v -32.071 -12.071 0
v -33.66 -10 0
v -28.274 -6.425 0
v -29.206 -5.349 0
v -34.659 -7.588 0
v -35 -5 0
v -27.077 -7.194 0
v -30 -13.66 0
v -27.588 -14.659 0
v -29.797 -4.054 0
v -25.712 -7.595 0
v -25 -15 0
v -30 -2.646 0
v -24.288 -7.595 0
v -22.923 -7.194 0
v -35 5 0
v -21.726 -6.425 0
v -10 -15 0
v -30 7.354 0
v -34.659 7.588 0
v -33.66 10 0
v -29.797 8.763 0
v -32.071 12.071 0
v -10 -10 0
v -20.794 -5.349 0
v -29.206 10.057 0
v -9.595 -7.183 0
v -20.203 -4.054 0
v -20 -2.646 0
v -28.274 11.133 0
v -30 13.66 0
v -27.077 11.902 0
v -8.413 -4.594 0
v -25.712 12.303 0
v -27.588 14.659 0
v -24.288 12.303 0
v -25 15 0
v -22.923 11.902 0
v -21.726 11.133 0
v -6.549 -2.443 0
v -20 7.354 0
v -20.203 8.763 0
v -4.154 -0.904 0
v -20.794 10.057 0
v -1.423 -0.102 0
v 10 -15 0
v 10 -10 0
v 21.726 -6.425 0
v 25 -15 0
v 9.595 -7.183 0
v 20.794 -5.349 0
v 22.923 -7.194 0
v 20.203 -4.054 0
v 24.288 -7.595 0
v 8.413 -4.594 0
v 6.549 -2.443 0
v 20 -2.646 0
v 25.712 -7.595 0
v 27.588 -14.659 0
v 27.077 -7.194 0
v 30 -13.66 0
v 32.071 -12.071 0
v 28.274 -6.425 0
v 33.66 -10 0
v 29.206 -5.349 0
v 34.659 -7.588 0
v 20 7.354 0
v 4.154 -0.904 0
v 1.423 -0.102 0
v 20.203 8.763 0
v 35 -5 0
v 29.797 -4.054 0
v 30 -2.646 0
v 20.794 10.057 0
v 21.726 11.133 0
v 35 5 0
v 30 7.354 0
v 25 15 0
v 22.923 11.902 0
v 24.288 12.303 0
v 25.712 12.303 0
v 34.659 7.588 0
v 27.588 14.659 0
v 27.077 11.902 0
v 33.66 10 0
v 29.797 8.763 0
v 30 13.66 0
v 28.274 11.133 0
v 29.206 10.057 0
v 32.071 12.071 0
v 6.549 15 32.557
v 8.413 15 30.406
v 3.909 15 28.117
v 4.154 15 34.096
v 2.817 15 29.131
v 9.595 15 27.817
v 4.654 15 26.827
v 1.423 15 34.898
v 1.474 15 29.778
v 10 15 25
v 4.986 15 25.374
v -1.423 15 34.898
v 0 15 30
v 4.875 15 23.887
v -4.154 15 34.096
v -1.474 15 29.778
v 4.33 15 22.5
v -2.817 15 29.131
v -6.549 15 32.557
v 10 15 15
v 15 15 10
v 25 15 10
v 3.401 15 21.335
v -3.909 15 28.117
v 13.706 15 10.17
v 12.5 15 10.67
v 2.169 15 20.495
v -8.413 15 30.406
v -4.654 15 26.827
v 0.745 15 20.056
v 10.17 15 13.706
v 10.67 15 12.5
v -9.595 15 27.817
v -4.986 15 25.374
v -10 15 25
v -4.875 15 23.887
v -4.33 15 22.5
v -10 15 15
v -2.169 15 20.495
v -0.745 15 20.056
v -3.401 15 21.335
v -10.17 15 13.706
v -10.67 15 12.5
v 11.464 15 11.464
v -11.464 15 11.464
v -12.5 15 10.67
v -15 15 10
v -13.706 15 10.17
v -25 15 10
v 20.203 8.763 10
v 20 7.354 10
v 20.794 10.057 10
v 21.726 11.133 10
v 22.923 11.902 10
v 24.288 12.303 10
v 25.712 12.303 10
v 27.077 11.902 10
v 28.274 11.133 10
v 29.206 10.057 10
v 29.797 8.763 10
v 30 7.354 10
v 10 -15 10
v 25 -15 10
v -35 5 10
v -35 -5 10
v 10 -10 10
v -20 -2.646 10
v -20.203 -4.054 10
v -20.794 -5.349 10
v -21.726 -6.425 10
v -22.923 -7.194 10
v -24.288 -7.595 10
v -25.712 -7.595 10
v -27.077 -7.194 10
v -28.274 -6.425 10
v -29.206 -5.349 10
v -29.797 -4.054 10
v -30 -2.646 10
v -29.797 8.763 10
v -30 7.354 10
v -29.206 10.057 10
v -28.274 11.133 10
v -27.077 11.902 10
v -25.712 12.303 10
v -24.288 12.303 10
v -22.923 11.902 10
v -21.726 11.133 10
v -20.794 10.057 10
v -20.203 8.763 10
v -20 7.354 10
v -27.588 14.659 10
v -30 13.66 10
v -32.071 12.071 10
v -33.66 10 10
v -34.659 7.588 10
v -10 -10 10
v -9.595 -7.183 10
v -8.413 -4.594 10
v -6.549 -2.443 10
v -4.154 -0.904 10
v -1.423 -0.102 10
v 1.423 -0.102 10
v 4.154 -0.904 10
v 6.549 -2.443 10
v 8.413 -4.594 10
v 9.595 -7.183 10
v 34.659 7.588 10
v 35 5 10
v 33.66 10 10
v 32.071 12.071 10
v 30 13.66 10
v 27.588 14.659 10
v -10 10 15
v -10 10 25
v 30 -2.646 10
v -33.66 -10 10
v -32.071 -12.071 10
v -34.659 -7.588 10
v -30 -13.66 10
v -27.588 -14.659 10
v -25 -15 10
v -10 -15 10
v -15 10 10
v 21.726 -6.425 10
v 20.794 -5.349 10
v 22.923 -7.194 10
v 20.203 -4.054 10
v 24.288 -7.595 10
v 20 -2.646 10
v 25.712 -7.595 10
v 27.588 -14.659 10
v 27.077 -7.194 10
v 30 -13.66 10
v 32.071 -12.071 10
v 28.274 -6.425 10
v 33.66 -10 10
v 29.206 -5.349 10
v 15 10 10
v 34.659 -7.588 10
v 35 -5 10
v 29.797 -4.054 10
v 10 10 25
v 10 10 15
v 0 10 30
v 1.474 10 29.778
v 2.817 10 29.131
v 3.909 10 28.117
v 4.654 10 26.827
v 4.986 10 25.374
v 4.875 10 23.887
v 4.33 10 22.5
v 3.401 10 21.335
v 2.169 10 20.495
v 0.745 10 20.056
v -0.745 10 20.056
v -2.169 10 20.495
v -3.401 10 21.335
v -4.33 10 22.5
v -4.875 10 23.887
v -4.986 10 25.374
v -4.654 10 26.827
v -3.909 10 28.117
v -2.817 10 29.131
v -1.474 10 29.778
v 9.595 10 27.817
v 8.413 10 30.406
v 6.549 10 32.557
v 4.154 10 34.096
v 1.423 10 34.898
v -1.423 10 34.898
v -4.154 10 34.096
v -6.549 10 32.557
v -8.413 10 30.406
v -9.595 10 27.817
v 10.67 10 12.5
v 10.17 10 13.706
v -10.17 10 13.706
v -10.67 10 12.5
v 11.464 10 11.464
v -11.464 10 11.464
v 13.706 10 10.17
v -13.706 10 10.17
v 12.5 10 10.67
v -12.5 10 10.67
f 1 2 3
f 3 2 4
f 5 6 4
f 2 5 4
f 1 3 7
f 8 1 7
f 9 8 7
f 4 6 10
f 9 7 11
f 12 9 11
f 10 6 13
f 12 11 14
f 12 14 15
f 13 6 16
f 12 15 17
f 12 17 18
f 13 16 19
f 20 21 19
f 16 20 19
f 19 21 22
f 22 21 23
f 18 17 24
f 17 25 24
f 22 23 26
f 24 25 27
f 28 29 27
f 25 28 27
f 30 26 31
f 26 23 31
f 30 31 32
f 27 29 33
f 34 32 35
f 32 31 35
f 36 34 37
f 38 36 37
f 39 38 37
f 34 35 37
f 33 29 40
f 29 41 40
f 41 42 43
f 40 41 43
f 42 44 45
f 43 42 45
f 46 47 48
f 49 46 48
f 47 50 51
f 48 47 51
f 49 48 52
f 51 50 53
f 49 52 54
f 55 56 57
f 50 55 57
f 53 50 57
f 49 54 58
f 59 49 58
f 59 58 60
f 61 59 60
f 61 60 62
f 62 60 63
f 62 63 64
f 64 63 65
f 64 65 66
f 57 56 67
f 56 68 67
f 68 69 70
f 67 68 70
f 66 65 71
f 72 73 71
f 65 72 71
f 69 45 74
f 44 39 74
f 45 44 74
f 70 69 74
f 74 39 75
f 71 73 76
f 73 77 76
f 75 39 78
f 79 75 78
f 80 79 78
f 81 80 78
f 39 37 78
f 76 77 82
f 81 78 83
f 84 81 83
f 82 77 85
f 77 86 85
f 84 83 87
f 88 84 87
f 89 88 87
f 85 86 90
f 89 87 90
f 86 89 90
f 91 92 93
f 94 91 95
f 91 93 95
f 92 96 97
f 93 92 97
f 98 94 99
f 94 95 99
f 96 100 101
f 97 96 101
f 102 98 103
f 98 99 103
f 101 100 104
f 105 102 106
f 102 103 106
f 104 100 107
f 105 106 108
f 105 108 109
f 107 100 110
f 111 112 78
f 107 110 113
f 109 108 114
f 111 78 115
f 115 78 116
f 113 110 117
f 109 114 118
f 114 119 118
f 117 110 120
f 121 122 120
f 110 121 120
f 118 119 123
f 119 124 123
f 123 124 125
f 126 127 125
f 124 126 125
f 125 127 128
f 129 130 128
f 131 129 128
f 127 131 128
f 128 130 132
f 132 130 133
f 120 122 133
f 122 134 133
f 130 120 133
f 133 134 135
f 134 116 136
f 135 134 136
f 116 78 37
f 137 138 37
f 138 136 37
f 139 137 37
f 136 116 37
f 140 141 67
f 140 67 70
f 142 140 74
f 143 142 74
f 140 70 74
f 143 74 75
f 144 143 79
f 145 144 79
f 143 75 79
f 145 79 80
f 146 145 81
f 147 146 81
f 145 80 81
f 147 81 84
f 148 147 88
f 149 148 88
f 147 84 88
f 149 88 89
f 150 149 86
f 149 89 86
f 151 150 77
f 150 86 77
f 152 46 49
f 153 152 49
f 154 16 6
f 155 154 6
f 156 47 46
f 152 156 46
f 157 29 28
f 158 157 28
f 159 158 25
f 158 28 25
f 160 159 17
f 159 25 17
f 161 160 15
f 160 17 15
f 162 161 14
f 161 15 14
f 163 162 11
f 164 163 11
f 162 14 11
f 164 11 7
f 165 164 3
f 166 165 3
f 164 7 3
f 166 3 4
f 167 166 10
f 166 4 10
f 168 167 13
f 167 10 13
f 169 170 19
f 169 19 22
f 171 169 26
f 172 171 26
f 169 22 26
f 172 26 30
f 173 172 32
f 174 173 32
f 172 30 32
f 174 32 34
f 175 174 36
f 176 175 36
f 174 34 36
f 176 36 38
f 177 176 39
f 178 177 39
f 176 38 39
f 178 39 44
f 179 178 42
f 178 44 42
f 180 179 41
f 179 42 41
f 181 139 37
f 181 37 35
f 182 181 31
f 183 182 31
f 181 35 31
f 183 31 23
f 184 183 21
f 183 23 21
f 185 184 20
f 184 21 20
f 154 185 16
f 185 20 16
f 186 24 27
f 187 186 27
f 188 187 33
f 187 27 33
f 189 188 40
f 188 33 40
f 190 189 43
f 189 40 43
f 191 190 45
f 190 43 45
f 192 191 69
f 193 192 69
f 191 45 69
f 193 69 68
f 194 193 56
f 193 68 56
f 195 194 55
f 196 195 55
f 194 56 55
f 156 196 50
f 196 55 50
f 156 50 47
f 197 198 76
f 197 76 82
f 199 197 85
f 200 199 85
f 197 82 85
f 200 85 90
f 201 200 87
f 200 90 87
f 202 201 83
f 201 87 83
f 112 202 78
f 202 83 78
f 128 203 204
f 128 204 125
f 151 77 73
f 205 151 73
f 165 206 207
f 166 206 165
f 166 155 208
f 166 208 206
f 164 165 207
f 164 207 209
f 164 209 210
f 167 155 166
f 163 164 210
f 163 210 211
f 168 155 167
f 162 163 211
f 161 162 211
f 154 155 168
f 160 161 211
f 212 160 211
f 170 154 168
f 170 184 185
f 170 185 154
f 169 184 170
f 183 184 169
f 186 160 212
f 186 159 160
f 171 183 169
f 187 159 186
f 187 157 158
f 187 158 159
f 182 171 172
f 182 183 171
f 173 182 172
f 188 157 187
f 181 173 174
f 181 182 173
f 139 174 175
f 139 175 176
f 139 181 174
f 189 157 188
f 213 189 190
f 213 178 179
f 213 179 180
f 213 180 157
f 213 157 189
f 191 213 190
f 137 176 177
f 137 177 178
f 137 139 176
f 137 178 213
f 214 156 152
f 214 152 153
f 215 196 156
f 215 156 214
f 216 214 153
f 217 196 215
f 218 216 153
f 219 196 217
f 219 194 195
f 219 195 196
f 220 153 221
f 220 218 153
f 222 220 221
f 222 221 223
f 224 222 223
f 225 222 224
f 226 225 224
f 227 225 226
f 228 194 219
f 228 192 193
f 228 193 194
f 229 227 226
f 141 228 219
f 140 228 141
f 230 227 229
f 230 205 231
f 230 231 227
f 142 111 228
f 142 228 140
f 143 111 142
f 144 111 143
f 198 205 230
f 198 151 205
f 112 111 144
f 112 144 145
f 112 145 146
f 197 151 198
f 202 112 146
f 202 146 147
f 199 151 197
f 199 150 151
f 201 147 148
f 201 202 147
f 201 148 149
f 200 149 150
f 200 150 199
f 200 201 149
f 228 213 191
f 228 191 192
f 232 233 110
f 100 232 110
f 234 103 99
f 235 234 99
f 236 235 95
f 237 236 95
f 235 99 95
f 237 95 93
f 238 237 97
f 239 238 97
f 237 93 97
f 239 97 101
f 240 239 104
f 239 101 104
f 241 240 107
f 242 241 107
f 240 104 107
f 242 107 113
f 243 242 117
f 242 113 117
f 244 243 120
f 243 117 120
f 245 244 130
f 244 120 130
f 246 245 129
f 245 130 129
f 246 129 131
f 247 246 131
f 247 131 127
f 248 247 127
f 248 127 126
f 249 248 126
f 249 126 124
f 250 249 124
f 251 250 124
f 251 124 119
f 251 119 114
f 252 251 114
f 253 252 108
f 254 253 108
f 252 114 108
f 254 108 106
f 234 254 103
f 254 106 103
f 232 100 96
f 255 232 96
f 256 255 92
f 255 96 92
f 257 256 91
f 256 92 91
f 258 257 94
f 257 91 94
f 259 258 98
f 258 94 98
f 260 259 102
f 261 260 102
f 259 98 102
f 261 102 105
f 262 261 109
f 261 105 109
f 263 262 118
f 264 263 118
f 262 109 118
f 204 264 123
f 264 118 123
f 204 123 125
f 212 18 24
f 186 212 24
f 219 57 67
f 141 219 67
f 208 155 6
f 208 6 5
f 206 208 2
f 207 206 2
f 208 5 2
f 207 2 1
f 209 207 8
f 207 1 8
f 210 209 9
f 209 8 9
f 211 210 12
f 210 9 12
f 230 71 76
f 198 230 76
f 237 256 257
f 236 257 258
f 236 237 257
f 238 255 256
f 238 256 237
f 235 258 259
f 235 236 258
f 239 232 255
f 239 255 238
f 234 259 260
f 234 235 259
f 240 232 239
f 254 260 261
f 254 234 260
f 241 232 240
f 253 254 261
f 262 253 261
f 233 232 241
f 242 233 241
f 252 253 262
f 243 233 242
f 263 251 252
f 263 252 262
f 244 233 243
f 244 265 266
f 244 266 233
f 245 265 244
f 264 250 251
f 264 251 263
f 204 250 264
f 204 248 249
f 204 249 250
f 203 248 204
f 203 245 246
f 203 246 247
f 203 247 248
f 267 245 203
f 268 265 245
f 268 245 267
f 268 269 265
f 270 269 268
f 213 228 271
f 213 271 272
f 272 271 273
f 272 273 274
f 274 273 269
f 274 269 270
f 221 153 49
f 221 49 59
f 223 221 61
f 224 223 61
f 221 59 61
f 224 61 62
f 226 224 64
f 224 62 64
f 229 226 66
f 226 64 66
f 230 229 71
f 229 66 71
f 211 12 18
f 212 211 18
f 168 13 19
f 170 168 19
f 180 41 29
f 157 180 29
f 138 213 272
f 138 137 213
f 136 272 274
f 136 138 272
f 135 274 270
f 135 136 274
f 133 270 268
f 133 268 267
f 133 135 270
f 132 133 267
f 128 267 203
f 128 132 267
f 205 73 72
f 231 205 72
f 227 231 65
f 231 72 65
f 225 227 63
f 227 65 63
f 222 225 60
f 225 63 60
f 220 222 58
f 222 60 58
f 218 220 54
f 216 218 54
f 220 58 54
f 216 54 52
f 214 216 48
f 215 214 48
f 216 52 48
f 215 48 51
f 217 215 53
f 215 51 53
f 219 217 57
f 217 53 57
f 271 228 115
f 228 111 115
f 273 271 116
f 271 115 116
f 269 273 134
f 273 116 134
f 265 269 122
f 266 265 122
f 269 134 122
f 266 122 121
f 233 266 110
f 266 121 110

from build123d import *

# Parameters (mm, degrees)
BOSS_EXTRUDE1_DEPTH = 10
SKETCH2_W           = 20
SKETCH2_H           = 5
BOSS_EXTRUDE2_DEPTH = 15
FILLET3_R           = 5
FILLET4_R           = 5
BOSS_EXTRUDE4_DEPTH = 5
SKETCH4_R           = 5
CUT_EXTRUDE1_DEPTH  = 5


with BuildPart() as part:
    # Sketch1 → Boss-Extrude1 (new body)
    with BuildSketch(Plane.XY):
        with BuildLine():
            Line((-10, -15), (-10, -10))
            ThreePointArc((-10, -10), (0, 0), (10, -10))
            Line((10, -10), (10, -15))
            Line((10, -15), (25, -15))
            ThreePointArc((25, -15), (32.071067812, -12.071067812), (35, -5))
            Line((35, -5), (35, 5))
            ThreePointArc((35, 5), (32.071067812, 12.071067812), (25, 15))
            Line((25, 15), (-25, 15))
            ThreePointArc((-25, 15), (-32.071067812, 12.071067812), (-35, 5))
            Line((-35, 5), (-35, -5))
            ThreePointArc((-35, -5), (-32.071067812, -12.071067812), (-25, -15))
            Line((-25, -15), (-10, -15))
        make_face()
        with BuildLine():
            Line((30, 7.354167283), (30, -2.645832717))
            ThreePointArc((30, -2.645832717), (25, -7.645832717), (20, -2.645832717))
            Line((20, -2.645832717), (20, 7.354167283))
            ThreePointArc((20, 7.354167283), (25, 12.354167283), (30, 7.354167283))
        make_face(mode=Mode.SUBTRACT)
        with BuildLine():
            Line((-20, 7.354167283), (-20, -2.645832717))
            ThreePointArc((-20, -2.645832717), (-25, -7.645832717), (-30, -2.645832717))
            Line((-30, -2.645832717), (-30, 7.354167283))
            ThreePointArc((-30, 7.354167283), (-25, 12.354167283), (-20, 7.354167283))
        make_face(mode=Mode.SUBTRACT)
    extrude(amount=BOSS_EXTRUDE1_DEPTH)

    # Sketch2 → Boss-Extrude2 (add)
    with BuildSketch(Plane.XY.offset(10)):
        with Locations((0, 12.5)):
            Rectangle(SKETCH2_W, SKETCH2_H)
    extrude(amount=BOSS_EXTRUDE2_DEPTH)

    # Fillet3
    fillet3_edges = [part.edges().sort_by_distance(p)[0] for p in [
        (-10, 12.5, 10),
    ]]
    fillet(fillet3_edges, radius=FILLET3_R)

    # Fillet4
    fillet4_edges = [part.edges().sort_by_distance(p)[0] for p in [
        (10, 12.5, 10),
    ]]
    fillet(fillet4_edges, radius=FILLET4_R)

    # Sketch3 → Boss-Extrude4 (add)
    with BuildSketch(Plane(origin=(0, 15, 0), x_dir=(1, 0, 0), z_dir=(0, 1, 0))):
        with BuildLine():
            Line((-10, -25), (10, -25))
            ThreePointArc((10, -25), (0, -35), (-10, -25))
        make_face()
    extrude(amount=-BOSS_EXTRUDE4_DEPTH)

    # Sketch4 → Cut-Extrude1 (cut)
    with BuildSketch(Plane(origin=(0, 15, 0), x_dir=(1, 0, 0), z_dir=(0, 1, 0))):
        with Locations(Location((0, -25, 0), (0, 0, 270))):
            Circle(SKETCH4_R)
    extrude(amount=-CUT_EXTRUDE1_DEPTH, mode=Mode.SUBTRACT)


solid = part.part
